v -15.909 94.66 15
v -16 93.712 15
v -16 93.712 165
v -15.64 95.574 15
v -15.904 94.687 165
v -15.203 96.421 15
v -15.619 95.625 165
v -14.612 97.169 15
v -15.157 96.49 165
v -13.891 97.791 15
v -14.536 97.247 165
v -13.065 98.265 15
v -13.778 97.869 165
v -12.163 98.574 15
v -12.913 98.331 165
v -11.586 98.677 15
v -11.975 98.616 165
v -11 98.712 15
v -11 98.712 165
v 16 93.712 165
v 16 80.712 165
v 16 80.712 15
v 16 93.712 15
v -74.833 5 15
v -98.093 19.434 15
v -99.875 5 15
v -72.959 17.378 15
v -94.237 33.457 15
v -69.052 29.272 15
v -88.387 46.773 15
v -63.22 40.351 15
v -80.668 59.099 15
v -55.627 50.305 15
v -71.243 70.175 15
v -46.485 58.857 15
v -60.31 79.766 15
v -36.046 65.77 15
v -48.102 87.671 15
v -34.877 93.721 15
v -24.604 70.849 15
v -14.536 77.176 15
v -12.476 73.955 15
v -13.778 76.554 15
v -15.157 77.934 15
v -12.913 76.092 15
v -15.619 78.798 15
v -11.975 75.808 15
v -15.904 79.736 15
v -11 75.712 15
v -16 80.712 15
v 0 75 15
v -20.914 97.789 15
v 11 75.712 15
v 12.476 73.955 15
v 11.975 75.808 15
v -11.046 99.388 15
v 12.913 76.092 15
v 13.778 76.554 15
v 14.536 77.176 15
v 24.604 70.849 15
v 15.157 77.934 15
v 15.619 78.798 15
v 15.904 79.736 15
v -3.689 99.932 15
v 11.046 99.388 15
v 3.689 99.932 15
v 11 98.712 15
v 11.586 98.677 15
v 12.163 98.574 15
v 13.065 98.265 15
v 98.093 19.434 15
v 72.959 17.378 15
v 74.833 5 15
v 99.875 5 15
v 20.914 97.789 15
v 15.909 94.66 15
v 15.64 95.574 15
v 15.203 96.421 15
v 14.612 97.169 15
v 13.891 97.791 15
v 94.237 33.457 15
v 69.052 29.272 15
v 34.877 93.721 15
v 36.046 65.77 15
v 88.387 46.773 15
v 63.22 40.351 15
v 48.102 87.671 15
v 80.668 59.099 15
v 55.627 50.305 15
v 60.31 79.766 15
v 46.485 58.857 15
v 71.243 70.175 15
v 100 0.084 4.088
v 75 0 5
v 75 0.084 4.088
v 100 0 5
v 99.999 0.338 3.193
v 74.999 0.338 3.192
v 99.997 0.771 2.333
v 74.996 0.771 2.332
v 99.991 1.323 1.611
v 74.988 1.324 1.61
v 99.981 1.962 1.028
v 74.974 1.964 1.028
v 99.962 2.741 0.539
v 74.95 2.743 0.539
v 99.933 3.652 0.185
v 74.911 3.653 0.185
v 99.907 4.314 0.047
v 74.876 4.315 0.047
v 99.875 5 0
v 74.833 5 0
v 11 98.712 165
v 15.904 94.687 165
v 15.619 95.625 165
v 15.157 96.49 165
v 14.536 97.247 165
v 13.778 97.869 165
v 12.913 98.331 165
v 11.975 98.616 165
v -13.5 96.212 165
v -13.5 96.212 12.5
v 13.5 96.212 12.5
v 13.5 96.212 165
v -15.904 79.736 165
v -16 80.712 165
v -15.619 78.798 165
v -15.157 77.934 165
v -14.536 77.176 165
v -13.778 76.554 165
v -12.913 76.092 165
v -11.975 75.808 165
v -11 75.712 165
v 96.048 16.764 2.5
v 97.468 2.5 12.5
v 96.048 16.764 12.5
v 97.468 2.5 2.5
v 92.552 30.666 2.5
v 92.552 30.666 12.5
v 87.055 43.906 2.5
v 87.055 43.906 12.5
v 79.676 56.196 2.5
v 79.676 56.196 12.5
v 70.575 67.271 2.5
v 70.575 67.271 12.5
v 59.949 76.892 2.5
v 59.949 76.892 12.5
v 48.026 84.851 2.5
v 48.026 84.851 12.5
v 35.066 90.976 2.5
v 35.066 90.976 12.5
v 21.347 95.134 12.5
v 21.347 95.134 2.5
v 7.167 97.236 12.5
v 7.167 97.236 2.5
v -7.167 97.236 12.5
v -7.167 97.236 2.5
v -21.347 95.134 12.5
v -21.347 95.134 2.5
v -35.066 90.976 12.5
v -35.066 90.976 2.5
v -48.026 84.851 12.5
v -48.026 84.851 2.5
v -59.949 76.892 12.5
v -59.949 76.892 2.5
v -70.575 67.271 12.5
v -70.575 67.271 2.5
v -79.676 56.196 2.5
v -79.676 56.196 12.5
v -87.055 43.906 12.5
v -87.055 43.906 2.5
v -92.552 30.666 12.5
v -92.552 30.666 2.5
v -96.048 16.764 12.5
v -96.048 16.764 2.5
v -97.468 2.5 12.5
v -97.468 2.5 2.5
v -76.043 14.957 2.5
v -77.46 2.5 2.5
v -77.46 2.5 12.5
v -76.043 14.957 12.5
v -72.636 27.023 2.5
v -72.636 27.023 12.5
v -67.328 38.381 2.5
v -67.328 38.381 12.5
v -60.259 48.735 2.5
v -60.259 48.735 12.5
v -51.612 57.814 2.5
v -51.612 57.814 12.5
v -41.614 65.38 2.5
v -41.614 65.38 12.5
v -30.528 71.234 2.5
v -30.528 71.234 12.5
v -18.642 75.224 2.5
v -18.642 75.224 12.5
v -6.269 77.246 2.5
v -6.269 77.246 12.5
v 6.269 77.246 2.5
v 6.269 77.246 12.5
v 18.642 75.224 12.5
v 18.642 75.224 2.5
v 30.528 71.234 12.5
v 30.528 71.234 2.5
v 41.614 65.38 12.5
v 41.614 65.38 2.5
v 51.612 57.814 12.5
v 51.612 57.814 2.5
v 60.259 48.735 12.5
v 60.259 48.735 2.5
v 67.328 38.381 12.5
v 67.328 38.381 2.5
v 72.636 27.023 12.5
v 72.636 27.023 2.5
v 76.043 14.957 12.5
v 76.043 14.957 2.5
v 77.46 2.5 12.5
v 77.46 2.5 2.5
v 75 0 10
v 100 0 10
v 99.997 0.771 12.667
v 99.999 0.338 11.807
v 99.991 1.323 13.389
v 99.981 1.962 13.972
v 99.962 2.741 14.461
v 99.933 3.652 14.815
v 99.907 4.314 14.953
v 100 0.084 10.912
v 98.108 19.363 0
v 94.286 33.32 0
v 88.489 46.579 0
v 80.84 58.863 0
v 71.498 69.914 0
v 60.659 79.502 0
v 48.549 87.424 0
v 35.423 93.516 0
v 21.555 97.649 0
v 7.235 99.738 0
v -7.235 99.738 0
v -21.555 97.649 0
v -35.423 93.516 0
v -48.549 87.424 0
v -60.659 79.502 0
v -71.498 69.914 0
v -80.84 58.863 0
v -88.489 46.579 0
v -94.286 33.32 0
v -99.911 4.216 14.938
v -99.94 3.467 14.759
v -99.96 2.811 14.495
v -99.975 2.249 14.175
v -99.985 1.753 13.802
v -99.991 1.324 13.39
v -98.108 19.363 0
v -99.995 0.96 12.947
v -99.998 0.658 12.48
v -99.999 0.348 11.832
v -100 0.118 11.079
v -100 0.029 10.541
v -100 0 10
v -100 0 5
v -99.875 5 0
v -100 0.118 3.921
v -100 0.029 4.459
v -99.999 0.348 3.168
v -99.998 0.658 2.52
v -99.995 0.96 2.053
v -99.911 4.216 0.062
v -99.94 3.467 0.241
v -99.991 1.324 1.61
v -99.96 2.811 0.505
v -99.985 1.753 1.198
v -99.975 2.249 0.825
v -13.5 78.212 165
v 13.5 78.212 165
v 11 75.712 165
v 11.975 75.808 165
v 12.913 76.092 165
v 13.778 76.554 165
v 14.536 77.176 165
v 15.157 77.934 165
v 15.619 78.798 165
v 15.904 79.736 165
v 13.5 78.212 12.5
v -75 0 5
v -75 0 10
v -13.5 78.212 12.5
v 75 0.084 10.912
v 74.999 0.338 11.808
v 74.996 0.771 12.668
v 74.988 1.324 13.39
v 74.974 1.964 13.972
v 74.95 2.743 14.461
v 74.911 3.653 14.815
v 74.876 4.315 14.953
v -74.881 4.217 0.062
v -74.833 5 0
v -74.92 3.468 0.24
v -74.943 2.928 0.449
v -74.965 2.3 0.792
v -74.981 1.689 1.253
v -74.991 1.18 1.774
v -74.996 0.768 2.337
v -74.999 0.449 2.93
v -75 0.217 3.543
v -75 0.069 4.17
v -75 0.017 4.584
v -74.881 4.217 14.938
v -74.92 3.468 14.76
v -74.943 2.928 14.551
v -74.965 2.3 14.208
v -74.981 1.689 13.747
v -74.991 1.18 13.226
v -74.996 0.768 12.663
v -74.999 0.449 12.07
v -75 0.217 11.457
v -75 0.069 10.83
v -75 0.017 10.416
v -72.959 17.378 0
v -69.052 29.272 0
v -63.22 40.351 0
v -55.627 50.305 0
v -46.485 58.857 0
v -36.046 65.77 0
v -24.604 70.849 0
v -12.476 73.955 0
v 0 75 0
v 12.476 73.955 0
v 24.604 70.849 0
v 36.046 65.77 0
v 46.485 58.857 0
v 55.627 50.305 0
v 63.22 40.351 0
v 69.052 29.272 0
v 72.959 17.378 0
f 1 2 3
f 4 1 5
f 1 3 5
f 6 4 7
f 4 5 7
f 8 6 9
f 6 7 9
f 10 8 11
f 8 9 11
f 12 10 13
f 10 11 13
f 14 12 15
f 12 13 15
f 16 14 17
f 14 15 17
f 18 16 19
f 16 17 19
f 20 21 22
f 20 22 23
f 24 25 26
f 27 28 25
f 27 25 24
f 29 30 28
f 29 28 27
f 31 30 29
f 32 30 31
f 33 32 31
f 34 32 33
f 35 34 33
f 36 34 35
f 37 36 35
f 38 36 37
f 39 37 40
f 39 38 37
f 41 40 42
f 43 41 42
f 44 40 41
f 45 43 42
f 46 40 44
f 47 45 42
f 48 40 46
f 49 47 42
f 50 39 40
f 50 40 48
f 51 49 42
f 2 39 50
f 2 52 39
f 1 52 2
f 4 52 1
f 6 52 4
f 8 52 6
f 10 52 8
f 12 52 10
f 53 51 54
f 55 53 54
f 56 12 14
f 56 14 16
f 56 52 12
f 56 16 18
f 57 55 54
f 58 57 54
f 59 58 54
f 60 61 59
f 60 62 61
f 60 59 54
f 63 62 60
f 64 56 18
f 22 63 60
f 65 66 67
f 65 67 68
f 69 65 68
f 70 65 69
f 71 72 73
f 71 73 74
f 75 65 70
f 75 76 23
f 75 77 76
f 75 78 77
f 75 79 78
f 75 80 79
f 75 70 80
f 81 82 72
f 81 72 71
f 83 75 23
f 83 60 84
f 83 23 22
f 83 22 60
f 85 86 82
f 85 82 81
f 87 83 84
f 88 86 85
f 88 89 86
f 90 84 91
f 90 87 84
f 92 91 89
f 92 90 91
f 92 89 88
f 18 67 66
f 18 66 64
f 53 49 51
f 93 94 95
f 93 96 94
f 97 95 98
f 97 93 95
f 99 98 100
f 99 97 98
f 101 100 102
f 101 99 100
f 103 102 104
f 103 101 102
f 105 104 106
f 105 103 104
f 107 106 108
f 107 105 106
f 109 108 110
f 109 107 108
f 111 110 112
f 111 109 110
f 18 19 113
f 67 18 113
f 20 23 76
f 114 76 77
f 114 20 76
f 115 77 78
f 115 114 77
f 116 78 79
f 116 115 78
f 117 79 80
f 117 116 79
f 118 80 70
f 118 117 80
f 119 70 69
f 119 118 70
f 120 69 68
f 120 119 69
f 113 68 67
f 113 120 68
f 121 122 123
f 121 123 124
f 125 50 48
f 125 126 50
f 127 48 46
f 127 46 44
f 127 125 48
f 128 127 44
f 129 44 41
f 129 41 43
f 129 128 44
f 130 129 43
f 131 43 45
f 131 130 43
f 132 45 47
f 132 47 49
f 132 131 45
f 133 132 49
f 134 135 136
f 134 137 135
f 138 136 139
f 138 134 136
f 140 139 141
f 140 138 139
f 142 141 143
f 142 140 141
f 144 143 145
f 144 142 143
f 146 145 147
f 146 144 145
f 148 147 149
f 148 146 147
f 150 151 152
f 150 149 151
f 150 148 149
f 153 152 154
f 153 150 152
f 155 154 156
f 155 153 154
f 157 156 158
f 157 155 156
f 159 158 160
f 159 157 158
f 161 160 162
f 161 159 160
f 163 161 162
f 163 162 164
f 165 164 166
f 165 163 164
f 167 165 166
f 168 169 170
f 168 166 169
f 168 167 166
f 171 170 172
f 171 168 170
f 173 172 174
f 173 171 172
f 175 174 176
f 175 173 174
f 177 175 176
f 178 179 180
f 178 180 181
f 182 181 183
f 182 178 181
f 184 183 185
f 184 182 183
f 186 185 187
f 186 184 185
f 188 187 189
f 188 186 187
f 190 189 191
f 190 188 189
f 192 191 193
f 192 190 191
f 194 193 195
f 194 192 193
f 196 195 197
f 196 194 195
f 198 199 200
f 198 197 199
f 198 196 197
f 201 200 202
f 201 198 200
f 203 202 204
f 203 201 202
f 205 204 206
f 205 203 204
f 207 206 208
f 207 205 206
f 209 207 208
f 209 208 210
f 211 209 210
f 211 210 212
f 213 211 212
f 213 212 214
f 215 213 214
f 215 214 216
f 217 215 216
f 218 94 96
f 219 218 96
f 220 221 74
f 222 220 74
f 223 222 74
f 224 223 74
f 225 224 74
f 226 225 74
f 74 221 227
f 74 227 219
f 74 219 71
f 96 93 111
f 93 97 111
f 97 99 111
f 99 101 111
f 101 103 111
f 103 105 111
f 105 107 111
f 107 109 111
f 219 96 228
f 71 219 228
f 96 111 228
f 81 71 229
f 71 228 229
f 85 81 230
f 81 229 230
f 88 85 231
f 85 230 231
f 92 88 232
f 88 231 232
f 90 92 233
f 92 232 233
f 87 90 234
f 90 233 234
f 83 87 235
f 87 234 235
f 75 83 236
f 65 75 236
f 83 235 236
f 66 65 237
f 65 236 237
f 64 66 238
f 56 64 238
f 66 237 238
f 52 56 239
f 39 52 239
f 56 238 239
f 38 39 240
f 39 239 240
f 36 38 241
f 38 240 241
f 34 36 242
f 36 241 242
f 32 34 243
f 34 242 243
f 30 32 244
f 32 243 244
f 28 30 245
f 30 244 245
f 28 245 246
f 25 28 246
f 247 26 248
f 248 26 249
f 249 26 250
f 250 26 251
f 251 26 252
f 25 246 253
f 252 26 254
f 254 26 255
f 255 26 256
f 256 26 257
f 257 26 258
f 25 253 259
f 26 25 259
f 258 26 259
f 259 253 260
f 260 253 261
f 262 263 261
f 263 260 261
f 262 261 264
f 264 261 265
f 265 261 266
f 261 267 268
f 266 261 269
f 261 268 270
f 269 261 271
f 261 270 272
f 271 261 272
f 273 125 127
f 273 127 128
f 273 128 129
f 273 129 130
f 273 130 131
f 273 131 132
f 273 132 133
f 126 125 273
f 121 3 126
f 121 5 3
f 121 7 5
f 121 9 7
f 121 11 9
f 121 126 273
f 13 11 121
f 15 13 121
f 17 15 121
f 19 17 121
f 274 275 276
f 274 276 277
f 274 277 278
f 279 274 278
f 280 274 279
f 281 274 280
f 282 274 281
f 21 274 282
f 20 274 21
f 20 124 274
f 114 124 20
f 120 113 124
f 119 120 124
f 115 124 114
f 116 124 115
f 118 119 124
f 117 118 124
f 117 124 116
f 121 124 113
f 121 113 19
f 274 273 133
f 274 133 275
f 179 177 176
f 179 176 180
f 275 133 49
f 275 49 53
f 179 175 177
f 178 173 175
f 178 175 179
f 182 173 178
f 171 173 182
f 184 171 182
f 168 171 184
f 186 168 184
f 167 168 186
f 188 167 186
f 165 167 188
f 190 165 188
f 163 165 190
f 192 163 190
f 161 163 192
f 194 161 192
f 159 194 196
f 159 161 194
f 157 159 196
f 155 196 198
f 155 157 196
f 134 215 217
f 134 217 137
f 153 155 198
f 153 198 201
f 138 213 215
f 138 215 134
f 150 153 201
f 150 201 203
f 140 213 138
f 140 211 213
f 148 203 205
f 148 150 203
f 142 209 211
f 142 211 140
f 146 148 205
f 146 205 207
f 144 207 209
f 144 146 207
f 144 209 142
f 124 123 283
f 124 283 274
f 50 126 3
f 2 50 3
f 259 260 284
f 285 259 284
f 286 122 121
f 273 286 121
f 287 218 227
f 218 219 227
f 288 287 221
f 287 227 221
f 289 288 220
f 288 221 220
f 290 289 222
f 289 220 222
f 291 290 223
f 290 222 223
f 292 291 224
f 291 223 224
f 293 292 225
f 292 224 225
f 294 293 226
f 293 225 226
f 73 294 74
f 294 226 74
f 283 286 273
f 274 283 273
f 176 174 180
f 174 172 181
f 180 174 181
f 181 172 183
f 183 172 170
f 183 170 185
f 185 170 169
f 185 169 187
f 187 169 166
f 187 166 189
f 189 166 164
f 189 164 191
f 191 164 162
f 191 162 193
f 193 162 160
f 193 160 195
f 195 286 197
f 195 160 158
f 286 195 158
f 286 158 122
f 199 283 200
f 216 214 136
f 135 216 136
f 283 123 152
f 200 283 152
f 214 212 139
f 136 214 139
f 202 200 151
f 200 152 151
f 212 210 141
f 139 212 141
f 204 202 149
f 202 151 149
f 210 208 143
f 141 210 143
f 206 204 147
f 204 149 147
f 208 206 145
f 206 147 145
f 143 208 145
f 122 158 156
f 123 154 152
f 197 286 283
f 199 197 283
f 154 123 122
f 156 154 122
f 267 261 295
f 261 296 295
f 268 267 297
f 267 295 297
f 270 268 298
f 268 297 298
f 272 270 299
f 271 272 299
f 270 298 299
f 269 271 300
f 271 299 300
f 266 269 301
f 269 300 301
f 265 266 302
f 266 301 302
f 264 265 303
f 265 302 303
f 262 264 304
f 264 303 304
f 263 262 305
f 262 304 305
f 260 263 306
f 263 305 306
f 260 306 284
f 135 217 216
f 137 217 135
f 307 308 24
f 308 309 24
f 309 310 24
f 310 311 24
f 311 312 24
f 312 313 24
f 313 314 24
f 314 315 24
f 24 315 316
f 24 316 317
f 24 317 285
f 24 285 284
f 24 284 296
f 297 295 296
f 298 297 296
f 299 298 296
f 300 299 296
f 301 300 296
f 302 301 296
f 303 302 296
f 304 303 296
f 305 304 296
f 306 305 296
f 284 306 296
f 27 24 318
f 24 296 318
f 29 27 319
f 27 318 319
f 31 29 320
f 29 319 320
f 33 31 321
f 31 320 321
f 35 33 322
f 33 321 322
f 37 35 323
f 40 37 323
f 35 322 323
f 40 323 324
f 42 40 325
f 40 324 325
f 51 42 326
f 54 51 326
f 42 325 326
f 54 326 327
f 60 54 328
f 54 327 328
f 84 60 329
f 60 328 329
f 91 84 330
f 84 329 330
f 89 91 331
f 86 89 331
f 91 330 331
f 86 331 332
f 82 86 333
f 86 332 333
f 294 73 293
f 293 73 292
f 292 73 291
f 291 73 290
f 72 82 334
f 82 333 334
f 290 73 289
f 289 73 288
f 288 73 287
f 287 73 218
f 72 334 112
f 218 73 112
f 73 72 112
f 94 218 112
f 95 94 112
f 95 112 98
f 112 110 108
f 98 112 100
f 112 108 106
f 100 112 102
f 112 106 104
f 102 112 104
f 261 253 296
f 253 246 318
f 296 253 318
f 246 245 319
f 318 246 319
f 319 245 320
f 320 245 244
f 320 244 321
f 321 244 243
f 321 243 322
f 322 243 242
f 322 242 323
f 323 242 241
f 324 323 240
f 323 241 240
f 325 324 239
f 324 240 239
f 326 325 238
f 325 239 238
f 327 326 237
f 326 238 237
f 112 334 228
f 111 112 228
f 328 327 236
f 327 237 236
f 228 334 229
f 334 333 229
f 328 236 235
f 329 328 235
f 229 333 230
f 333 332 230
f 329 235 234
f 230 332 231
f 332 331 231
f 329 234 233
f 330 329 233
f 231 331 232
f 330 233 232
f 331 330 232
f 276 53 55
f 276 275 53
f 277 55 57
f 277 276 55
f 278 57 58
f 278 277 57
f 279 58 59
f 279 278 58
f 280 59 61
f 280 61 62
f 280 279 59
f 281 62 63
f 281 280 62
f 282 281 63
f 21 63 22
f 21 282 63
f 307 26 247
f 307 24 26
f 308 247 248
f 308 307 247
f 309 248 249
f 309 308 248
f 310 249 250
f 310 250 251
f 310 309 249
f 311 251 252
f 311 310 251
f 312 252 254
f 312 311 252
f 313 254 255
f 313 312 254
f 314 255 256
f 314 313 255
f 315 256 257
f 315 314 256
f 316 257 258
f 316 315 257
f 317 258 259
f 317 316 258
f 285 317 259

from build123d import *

# Parameters (mm, degrees)
F1_DEPTH    = 15
F2_W        = 32
F2_H        = 23
F3_DEPTH    = 150
F4_T        = 2.5
F4_T3_DEPTH = 28
F4_T5_DEPTH = 37
F5_R        = 5


# Not quite as in the source:
# - a shell that OpenCascade refuses in one call is made with other operations: the cavity is built on its own and cut out


with BuildPart() as f1:
    # F0 (on Top) → F1 (new body)
    with BuildSketch(Plane.XY):
        with BuildLine():
            Line((75, 0), (100, 0))
            ThreePointArc((100, 0), (0, 100), (-100, 0))
            Line((-100, 0), (-75, 0))
            ThreePointArc((-75, 0), (0, 75), (75, 0))
        make_face()
    extrude(amount=F1_DEPTH)

    # F2 (on face) → F3 (join)
    with BuildSketch(Plane.XY.offset(15)):
        with Locations((0, 87.211701434)):
            Rectangle(F2_W, F2_H)
    extrude(amount=F3_DEPTH)

    # F4: shell of thickness 2.5, made by hand


with BuildPart() as f4_core1:
    # F4_t2: copy of F1
    add(f1.part)

    # the walls: a layer under each face that stays
    f4_faces = [f4_core1.faces().sort_by_distance(p)[0] for p in [
        (-87.5, 0, 7.5),
        (0, 100, 7.5),
        (0, 75, 7.5),
        (-66.6666666667, 50, 0),
        (-66.6666666667, 49.355850717, 15),
        (87.5, 0, 7.5),
        (0, 99.355850717, 15),
        (-16, 87.211701434, 90),
        (0, 75.711701434, 90),
        (16, 87.211701434, 90),
        (0, 98.711701434, 90),
    ]]
    thicken(f4_faces, amount=-F4_T, mode=Mode.SUBTRACT)

    # F4_s4 → F4_t3 (cut)
    with BuildSketch(Plane.XZ.offset(-101.211701434)):
        Polygon((-16.025, 15.025), (-16, 12.5), (-13.5, 12.5), (-13.5, 15), align=None)
        Polygon((16.025, 15.025), (16, 12.5), (13.5, 12.5), (13.5, 15), align=None)
    extrude(amount=F4_T3_DEPTH, mode=Mode.SUBTRACT)

    # F4_s6 → F4_t5 (cut)
    with BuildSketch(Plane.YZ.offset(-18.5)):
        Polygon((75.686701434, 15.025), (75.711701434, 12.5), (78.211701434, 12.5), (78.211701434, 15), align=None)
        Polygon((98.736701434, 15.025), (98.711701434, 12.5), (96.211701434, 12.5), (96.211701434, 15), align=None)
    extrude(amount=F4_T5_DEPTH, mode=Mode.SUBTRACT)


with BuildPart() as f1_1:
    add(f1.part)

    # what is left inside the walls is the cavity
    f4_cavity = [f4_core1.part.solids().sort_by_distance(p)[0] for p in [
        (-48.733972, 65.833333, 2.525),
    ]]
    add(f4_cavity, mode=Mode.SUBTRACT)

    # F5
    f5_edges = [f1_1.edges().sort_by_distance(p)[0] for p in [
        (-16, 75.711701, 90),
        (-16, 98.711701, 90),
        (16, 98.711701, 90),
        (16, 75.711701, 90),
        (-87.5, 0, 15),
        (-87.5, 0, 0),
        (87.5, 0, 15),
        (87.5, 0, 0),
    ]]
    fillet(f5_edges, radius=F5_R)


solid = f1_1.part
